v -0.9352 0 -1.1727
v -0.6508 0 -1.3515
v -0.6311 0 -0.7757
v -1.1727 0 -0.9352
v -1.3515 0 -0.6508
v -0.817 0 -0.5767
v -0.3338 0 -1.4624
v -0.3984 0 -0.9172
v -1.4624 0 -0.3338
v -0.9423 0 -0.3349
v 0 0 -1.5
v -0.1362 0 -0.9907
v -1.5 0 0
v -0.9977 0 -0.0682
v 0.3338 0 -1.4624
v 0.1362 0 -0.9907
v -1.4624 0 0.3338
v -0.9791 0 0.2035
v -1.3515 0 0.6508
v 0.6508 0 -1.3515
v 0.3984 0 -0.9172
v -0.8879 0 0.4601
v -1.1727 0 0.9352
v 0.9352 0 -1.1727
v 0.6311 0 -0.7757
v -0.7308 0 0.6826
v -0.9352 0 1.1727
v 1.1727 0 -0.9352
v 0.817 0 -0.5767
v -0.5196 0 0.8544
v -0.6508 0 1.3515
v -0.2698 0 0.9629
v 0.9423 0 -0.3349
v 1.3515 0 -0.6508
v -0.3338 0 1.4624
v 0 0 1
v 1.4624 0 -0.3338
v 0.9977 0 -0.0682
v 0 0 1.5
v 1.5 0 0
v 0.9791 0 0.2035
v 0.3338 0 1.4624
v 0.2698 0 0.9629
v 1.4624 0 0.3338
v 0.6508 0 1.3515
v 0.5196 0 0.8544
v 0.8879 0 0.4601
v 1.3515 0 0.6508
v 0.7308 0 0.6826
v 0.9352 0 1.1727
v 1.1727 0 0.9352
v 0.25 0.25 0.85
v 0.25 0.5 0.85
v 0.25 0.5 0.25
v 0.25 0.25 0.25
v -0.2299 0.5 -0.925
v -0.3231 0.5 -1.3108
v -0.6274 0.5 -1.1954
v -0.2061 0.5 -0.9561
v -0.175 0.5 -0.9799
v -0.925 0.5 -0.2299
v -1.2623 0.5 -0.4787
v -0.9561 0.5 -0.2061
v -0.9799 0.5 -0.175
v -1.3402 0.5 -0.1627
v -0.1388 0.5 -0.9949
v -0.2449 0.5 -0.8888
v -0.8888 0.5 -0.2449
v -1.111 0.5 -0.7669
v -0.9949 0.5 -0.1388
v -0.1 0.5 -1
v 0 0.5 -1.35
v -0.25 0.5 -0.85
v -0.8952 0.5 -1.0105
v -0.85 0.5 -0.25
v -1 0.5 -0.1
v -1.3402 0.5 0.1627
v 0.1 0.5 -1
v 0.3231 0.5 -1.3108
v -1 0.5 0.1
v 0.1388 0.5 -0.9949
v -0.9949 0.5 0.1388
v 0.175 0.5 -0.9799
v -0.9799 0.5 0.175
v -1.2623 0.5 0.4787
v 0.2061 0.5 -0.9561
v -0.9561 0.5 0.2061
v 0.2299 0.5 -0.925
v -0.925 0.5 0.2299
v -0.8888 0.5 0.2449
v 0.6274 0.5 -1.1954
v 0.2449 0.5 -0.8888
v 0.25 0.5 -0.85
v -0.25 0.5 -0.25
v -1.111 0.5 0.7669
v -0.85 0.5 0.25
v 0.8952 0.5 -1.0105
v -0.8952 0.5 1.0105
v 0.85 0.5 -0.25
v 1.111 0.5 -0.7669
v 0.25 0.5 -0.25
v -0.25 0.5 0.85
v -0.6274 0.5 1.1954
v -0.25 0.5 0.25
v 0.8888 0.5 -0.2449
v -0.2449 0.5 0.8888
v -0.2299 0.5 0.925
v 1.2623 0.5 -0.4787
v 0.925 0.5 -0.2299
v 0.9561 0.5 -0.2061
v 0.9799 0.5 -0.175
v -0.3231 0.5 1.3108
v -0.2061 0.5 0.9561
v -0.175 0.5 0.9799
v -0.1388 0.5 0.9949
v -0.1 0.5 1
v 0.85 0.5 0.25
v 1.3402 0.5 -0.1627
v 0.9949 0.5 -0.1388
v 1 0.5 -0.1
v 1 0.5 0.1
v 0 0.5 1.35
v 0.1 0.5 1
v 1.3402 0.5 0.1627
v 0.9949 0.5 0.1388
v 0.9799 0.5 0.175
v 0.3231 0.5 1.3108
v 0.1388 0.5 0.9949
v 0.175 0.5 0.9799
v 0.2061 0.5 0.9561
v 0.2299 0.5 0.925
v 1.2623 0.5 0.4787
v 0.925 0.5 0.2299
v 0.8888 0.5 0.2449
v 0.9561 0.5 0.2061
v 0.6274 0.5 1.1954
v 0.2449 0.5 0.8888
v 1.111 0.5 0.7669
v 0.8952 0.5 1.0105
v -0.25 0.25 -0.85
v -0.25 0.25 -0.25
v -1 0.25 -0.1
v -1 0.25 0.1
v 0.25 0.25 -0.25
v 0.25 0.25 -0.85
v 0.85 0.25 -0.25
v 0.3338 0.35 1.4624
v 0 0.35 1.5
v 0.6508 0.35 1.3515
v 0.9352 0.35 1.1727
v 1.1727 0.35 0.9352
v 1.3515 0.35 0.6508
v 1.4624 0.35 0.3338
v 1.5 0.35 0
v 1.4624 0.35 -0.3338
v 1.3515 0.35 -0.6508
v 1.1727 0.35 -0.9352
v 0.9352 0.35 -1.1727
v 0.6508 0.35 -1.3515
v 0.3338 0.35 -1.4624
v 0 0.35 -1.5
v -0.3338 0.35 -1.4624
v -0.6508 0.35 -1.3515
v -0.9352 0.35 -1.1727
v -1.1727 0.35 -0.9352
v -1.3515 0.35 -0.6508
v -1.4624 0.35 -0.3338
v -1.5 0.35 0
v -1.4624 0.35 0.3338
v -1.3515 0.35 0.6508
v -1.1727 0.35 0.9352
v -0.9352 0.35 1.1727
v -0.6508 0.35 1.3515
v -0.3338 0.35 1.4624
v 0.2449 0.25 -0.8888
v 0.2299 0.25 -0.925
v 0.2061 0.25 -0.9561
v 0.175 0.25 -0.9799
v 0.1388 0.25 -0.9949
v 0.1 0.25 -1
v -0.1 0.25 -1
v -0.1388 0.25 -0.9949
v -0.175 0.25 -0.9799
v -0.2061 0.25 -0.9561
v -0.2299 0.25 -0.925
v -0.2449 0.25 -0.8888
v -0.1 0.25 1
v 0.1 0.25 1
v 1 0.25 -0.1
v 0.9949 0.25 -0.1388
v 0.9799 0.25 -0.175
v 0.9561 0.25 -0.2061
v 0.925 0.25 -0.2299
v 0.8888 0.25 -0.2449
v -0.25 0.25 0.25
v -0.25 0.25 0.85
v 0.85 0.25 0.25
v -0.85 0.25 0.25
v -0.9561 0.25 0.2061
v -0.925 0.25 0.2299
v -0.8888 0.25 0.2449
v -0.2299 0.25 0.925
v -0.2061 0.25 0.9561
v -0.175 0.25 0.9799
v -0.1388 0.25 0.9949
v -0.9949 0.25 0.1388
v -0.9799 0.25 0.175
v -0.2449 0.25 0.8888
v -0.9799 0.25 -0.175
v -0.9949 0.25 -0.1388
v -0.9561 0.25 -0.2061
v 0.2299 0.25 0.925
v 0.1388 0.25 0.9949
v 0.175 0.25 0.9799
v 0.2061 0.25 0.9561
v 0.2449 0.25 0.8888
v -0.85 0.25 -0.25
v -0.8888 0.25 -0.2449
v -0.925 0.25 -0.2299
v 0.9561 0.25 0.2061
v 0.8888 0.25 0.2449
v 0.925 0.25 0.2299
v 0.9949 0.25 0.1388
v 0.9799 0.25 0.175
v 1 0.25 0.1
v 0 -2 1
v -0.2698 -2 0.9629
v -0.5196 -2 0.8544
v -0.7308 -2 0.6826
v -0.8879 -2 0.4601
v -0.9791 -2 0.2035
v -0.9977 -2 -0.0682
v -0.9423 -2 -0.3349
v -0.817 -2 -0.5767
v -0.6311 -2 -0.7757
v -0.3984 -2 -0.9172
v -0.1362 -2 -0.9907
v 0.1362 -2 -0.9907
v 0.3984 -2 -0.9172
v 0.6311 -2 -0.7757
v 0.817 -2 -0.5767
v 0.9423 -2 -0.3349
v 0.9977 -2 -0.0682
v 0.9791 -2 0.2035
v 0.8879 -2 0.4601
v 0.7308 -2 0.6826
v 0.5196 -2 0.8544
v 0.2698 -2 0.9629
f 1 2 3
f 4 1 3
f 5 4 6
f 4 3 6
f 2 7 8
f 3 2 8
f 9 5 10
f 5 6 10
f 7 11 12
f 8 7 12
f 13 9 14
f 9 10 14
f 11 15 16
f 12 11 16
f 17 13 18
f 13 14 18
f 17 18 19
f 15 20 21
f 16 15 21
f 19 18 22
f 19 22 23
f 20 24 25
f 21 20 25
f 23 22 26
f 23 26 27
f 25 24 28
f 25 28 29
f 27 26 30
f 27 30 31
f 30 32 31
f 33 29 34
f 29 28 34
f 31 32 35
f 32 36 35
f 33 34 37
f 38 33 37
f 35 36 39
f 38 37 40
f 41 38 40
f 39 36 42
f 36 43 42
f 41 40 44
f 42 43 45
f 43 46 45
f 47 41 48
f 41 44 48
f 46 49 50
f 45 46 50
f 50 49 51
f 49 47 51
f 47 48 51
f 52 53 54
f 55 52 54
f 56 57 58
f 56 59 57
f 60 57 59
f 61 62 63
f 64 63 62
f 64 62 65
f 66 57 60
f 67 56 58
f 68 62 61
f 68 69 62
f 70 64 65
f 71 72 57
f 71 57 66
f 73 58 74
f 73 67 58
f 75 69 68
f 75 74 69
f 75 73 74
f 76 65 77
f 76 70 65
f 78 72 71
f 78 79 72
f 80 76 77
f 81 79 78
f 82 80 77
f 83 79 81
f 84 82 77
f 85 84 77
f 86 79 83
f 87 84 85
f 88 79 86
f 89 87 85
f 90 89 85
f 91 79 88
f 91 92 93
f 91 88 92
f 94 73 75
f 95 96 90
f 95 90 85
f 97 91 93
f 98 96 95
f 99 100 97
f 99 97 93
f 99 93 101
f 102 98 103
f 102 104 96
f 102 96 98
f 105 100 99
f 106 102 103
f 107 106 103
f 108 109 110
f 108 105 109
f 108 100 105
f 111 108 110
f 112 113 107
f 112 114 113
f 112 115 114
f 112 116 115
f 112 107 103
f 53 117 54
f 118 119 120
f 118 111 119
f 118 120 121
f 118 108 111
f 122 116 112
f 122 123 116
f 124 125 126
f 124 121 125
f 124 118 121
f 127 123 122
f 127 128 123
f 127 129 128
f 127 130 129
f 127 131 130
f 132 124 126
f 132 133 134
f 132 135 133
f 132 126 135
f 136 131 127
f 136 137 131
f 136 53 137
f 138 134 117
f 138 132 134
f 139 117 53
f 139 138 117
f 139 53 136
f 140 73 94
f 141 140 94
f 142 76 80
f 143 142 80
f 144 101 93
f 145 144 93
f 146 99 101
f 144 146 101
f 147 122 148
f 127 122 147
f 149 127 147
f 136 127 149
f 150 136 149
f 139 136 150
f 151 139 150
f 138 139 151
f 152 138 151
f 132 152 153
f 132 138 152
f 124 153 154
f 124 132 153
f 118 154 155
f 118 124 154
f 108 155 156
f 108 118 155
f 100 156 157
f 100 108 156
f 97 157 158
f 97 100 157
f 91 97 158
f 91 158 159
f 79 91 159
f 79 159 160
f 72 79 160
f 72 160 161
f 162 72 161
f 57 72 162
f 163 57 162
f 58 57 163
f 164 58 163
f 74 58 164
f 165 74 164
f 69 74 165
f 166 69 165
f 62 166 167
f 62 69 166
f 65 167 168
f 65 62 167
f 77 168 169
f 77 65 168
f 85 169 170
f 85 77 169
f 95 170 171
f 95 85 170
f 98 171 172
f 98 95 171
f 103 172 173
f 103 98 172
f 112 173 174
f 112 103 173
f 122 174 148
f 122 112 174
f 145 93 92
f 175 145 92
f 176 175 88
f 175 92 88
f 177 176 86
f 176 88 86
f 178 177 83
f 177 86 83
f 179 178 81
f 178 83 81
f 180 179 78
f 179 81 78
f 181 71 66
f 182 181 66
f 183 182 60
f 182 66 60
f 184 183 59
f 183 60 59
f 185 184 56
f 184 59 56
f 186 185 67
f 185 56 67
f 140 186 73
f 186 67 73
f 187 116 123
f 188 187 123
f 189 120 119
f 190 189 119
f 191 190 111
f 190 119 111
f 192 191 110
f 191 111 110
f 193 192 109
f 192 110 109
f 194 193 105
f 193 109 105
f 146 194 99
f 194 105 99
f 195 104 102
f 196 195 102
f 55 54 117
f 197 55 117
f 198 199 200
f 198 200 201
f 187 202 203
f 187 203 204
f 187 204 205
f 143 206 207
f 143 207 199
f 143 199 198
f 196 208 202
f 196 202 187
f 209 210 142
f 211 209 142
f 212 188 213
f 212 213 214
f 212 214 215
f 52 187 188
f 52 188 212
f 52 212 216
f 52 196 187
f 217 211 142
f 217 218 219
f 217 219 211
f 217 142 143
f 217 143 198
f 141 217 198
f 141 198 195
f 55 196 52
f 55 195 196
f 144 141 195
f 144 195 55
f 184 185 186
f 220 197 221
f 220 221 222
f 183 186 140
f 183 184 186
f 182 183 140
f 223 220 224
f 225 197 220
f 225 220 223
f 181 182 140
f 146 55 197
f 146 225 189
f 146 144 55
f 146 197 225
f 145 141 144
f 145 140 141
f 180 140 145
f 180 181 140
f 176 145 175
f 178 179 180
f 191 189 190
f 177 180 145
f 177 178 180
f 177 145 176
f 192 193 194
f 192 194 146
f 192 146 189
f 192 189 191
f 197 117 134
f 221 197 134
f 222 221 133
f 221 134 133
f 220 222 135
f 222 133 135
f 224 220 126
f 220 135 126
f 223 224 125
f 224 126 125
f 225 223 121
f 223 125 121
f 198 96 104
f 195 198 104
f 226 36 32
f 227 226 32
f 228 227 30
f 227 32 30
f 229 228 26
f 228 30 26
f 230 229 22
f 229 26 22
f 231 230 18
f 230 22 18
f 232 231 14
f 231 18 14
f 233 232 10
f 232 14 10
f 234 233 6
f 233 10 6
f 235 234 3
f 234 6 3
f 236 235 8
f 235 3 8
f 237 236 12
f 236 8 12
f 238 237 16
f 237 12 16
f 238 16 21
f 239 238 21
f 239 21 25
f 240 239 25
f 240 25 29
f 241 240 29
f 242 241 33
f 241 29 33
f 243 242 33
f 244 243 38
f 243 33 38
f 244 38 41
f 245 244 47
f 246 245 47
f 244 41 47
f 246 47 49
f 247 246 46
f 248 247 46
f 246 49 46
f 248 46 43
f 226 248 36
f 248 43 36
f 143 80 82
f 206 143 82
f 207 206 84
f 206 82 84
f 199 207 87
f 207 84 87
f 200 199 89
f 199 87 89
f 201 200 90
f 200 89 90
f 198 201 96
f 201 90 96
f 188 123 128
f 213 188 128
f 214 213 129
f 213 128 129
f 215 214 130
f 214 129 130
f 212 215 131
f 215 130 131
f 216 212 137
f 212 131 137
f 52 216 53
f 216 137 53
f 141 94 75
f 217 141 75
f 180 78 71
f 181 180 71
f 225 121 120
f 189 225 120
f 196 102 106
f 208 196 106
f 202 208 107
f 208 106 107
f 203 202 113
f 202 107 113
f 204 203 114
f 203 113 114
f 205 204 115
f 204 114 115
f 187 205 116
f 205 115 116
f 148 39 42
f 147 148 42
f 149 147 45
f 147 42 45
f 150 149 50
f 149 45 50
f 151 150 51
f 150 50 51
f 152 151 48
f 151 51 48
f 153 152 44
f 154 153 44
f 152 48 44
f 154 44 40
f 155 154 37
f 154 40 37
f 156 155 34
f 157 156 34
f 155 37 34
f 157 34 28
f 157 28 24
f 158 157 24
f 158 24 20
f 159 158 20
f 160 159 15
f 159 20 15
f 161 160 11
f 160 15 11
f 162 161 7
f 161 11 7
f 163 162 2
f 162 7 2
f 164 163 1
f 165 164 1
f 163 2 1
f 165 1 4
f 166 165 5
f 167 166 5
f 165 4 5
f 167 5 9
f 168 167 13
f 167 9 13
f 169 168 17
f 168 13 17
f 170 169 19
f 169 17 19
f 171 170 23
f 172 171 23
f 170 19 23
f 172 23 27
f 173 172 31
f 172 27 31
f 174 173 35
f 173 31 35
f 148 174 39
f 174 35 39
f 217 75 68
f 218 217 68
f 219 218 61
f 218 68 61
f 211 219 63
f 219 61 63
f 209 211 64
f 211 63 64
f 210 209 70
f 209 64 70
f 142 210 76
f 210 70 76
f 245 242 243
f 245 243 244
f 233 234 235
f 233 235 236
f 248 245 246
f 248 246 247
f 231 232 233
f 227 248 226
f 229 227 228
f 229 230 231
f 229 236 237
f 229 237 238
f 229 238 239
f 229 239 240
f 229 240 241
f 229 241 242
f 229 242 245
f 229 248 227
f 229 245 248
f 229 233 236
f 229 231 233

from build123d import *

# Parameters (mm, degrees)
SKETCH1_R           = 1.5
BOSS_EXTRUDE1_DEPTH = 0.5
CUT_EXTRUDE1_DEPTH  = 0.25
CHAMFER1_SIZE       = 0.15
SKETCH3_R           = 1
BOSS_EXTRUDE2_DEPTH = 2


with BuildPart() as part:
    # Sketch1 → Boss-Extrude1 (new body)
    with BuildSketch(Plane(origin=(0, 0, 0), x_dir=(1, 0, 0), z_dir=(0, 1, 0))):
        with Locations(Location((0, 0, 0), (0, 0, 270))):
            Circle(SKETCH1_R)
    extrude(amount=BOSS_EXTRUDE1_DEPTH)

    # Sketch2 → Cut-Extrude1 (cut)
    with BuildSketch(Plane(origin=(0, 0.5, 0), x_dir=(1, 0, 0), z_dir=(0, 1, 0))):
        with BuildLine():
            Line((-0.1, -1), (0.1, -1))
            ThreePointArc((0.1, -1), (0.206066017, -0.956066017), (0.25, -0.85))
            Line((0.25, -0.85), (0.25, -0.25))
            Line((0.25, -0.25), (0.85, -0.25))
            ThreePointArc((0.85, -0.25), (0.956066017, -0.206066017), (1, -0.1))
            Line((1, -0.1), (1, 0.1))
            ThreePointArc((1, 0.1), (0.956066017, 0.206066017), (0.85, 0.25))
            Line((0.85, 0.25), (0.25, 0.25))
            Line((0.25, 0.25), (0.25, 0.85))
            ThreePointArc((0.25, 0.85), (0.206066017, 0.956066017), (0.1, 1))
            Line((0.1, 1), (-0.1, 1))
            ThreePointArc((-0.1, 1), (-0.206066017, 0.956066017), (-0.25, 0.85))
            Line((-0.25, 0.85), (-0.25, 0.25))
            Line((-0.25, 0.25), (-0.85, 0.25))
            ThreePointArc((-0.85, 0.25), (-0.956066017, 0.206066017), (-1, 0.1))
            Line((-1, 0.1), (-1, -0.1))
            ThreePointArc((-1, -0.1), (-0.956066017, -0.206066017), (-0.85, -0.25))
            Line((-0.85, -0.25), (-0.25, -0.25))
            Line((-0.25, -0.25), (-0.25, -0.85))
            ThreePointArc((-0.25, -0.85), (-0.206066017, -0.956066017), (-0.1, -1))
        make_face()
    extrude(amount=-CUT_EXTRUDE1_DEPTH, mode=Mode.SUBTRACT)

    # Chamfer1
    chamfer1_edges = [part.edges().sort_by_distance(p)[0] for p in [
        (0, 0.5, -1.5),
    ]]
    chamfer(chamfer1_edges, length=CHAMFER1_SIZE)

    # Sketch3 → Boss-Extrude2 (add)
    with BuildSketch(Plane.XZ):
        with Locations(Location((0, 0, 0), (0, 0, 90))):
            Circle(SKETCH3_R)
    extrude(amount=BOSS_EXTRUDE2_DEPTH)


solid = part.part
